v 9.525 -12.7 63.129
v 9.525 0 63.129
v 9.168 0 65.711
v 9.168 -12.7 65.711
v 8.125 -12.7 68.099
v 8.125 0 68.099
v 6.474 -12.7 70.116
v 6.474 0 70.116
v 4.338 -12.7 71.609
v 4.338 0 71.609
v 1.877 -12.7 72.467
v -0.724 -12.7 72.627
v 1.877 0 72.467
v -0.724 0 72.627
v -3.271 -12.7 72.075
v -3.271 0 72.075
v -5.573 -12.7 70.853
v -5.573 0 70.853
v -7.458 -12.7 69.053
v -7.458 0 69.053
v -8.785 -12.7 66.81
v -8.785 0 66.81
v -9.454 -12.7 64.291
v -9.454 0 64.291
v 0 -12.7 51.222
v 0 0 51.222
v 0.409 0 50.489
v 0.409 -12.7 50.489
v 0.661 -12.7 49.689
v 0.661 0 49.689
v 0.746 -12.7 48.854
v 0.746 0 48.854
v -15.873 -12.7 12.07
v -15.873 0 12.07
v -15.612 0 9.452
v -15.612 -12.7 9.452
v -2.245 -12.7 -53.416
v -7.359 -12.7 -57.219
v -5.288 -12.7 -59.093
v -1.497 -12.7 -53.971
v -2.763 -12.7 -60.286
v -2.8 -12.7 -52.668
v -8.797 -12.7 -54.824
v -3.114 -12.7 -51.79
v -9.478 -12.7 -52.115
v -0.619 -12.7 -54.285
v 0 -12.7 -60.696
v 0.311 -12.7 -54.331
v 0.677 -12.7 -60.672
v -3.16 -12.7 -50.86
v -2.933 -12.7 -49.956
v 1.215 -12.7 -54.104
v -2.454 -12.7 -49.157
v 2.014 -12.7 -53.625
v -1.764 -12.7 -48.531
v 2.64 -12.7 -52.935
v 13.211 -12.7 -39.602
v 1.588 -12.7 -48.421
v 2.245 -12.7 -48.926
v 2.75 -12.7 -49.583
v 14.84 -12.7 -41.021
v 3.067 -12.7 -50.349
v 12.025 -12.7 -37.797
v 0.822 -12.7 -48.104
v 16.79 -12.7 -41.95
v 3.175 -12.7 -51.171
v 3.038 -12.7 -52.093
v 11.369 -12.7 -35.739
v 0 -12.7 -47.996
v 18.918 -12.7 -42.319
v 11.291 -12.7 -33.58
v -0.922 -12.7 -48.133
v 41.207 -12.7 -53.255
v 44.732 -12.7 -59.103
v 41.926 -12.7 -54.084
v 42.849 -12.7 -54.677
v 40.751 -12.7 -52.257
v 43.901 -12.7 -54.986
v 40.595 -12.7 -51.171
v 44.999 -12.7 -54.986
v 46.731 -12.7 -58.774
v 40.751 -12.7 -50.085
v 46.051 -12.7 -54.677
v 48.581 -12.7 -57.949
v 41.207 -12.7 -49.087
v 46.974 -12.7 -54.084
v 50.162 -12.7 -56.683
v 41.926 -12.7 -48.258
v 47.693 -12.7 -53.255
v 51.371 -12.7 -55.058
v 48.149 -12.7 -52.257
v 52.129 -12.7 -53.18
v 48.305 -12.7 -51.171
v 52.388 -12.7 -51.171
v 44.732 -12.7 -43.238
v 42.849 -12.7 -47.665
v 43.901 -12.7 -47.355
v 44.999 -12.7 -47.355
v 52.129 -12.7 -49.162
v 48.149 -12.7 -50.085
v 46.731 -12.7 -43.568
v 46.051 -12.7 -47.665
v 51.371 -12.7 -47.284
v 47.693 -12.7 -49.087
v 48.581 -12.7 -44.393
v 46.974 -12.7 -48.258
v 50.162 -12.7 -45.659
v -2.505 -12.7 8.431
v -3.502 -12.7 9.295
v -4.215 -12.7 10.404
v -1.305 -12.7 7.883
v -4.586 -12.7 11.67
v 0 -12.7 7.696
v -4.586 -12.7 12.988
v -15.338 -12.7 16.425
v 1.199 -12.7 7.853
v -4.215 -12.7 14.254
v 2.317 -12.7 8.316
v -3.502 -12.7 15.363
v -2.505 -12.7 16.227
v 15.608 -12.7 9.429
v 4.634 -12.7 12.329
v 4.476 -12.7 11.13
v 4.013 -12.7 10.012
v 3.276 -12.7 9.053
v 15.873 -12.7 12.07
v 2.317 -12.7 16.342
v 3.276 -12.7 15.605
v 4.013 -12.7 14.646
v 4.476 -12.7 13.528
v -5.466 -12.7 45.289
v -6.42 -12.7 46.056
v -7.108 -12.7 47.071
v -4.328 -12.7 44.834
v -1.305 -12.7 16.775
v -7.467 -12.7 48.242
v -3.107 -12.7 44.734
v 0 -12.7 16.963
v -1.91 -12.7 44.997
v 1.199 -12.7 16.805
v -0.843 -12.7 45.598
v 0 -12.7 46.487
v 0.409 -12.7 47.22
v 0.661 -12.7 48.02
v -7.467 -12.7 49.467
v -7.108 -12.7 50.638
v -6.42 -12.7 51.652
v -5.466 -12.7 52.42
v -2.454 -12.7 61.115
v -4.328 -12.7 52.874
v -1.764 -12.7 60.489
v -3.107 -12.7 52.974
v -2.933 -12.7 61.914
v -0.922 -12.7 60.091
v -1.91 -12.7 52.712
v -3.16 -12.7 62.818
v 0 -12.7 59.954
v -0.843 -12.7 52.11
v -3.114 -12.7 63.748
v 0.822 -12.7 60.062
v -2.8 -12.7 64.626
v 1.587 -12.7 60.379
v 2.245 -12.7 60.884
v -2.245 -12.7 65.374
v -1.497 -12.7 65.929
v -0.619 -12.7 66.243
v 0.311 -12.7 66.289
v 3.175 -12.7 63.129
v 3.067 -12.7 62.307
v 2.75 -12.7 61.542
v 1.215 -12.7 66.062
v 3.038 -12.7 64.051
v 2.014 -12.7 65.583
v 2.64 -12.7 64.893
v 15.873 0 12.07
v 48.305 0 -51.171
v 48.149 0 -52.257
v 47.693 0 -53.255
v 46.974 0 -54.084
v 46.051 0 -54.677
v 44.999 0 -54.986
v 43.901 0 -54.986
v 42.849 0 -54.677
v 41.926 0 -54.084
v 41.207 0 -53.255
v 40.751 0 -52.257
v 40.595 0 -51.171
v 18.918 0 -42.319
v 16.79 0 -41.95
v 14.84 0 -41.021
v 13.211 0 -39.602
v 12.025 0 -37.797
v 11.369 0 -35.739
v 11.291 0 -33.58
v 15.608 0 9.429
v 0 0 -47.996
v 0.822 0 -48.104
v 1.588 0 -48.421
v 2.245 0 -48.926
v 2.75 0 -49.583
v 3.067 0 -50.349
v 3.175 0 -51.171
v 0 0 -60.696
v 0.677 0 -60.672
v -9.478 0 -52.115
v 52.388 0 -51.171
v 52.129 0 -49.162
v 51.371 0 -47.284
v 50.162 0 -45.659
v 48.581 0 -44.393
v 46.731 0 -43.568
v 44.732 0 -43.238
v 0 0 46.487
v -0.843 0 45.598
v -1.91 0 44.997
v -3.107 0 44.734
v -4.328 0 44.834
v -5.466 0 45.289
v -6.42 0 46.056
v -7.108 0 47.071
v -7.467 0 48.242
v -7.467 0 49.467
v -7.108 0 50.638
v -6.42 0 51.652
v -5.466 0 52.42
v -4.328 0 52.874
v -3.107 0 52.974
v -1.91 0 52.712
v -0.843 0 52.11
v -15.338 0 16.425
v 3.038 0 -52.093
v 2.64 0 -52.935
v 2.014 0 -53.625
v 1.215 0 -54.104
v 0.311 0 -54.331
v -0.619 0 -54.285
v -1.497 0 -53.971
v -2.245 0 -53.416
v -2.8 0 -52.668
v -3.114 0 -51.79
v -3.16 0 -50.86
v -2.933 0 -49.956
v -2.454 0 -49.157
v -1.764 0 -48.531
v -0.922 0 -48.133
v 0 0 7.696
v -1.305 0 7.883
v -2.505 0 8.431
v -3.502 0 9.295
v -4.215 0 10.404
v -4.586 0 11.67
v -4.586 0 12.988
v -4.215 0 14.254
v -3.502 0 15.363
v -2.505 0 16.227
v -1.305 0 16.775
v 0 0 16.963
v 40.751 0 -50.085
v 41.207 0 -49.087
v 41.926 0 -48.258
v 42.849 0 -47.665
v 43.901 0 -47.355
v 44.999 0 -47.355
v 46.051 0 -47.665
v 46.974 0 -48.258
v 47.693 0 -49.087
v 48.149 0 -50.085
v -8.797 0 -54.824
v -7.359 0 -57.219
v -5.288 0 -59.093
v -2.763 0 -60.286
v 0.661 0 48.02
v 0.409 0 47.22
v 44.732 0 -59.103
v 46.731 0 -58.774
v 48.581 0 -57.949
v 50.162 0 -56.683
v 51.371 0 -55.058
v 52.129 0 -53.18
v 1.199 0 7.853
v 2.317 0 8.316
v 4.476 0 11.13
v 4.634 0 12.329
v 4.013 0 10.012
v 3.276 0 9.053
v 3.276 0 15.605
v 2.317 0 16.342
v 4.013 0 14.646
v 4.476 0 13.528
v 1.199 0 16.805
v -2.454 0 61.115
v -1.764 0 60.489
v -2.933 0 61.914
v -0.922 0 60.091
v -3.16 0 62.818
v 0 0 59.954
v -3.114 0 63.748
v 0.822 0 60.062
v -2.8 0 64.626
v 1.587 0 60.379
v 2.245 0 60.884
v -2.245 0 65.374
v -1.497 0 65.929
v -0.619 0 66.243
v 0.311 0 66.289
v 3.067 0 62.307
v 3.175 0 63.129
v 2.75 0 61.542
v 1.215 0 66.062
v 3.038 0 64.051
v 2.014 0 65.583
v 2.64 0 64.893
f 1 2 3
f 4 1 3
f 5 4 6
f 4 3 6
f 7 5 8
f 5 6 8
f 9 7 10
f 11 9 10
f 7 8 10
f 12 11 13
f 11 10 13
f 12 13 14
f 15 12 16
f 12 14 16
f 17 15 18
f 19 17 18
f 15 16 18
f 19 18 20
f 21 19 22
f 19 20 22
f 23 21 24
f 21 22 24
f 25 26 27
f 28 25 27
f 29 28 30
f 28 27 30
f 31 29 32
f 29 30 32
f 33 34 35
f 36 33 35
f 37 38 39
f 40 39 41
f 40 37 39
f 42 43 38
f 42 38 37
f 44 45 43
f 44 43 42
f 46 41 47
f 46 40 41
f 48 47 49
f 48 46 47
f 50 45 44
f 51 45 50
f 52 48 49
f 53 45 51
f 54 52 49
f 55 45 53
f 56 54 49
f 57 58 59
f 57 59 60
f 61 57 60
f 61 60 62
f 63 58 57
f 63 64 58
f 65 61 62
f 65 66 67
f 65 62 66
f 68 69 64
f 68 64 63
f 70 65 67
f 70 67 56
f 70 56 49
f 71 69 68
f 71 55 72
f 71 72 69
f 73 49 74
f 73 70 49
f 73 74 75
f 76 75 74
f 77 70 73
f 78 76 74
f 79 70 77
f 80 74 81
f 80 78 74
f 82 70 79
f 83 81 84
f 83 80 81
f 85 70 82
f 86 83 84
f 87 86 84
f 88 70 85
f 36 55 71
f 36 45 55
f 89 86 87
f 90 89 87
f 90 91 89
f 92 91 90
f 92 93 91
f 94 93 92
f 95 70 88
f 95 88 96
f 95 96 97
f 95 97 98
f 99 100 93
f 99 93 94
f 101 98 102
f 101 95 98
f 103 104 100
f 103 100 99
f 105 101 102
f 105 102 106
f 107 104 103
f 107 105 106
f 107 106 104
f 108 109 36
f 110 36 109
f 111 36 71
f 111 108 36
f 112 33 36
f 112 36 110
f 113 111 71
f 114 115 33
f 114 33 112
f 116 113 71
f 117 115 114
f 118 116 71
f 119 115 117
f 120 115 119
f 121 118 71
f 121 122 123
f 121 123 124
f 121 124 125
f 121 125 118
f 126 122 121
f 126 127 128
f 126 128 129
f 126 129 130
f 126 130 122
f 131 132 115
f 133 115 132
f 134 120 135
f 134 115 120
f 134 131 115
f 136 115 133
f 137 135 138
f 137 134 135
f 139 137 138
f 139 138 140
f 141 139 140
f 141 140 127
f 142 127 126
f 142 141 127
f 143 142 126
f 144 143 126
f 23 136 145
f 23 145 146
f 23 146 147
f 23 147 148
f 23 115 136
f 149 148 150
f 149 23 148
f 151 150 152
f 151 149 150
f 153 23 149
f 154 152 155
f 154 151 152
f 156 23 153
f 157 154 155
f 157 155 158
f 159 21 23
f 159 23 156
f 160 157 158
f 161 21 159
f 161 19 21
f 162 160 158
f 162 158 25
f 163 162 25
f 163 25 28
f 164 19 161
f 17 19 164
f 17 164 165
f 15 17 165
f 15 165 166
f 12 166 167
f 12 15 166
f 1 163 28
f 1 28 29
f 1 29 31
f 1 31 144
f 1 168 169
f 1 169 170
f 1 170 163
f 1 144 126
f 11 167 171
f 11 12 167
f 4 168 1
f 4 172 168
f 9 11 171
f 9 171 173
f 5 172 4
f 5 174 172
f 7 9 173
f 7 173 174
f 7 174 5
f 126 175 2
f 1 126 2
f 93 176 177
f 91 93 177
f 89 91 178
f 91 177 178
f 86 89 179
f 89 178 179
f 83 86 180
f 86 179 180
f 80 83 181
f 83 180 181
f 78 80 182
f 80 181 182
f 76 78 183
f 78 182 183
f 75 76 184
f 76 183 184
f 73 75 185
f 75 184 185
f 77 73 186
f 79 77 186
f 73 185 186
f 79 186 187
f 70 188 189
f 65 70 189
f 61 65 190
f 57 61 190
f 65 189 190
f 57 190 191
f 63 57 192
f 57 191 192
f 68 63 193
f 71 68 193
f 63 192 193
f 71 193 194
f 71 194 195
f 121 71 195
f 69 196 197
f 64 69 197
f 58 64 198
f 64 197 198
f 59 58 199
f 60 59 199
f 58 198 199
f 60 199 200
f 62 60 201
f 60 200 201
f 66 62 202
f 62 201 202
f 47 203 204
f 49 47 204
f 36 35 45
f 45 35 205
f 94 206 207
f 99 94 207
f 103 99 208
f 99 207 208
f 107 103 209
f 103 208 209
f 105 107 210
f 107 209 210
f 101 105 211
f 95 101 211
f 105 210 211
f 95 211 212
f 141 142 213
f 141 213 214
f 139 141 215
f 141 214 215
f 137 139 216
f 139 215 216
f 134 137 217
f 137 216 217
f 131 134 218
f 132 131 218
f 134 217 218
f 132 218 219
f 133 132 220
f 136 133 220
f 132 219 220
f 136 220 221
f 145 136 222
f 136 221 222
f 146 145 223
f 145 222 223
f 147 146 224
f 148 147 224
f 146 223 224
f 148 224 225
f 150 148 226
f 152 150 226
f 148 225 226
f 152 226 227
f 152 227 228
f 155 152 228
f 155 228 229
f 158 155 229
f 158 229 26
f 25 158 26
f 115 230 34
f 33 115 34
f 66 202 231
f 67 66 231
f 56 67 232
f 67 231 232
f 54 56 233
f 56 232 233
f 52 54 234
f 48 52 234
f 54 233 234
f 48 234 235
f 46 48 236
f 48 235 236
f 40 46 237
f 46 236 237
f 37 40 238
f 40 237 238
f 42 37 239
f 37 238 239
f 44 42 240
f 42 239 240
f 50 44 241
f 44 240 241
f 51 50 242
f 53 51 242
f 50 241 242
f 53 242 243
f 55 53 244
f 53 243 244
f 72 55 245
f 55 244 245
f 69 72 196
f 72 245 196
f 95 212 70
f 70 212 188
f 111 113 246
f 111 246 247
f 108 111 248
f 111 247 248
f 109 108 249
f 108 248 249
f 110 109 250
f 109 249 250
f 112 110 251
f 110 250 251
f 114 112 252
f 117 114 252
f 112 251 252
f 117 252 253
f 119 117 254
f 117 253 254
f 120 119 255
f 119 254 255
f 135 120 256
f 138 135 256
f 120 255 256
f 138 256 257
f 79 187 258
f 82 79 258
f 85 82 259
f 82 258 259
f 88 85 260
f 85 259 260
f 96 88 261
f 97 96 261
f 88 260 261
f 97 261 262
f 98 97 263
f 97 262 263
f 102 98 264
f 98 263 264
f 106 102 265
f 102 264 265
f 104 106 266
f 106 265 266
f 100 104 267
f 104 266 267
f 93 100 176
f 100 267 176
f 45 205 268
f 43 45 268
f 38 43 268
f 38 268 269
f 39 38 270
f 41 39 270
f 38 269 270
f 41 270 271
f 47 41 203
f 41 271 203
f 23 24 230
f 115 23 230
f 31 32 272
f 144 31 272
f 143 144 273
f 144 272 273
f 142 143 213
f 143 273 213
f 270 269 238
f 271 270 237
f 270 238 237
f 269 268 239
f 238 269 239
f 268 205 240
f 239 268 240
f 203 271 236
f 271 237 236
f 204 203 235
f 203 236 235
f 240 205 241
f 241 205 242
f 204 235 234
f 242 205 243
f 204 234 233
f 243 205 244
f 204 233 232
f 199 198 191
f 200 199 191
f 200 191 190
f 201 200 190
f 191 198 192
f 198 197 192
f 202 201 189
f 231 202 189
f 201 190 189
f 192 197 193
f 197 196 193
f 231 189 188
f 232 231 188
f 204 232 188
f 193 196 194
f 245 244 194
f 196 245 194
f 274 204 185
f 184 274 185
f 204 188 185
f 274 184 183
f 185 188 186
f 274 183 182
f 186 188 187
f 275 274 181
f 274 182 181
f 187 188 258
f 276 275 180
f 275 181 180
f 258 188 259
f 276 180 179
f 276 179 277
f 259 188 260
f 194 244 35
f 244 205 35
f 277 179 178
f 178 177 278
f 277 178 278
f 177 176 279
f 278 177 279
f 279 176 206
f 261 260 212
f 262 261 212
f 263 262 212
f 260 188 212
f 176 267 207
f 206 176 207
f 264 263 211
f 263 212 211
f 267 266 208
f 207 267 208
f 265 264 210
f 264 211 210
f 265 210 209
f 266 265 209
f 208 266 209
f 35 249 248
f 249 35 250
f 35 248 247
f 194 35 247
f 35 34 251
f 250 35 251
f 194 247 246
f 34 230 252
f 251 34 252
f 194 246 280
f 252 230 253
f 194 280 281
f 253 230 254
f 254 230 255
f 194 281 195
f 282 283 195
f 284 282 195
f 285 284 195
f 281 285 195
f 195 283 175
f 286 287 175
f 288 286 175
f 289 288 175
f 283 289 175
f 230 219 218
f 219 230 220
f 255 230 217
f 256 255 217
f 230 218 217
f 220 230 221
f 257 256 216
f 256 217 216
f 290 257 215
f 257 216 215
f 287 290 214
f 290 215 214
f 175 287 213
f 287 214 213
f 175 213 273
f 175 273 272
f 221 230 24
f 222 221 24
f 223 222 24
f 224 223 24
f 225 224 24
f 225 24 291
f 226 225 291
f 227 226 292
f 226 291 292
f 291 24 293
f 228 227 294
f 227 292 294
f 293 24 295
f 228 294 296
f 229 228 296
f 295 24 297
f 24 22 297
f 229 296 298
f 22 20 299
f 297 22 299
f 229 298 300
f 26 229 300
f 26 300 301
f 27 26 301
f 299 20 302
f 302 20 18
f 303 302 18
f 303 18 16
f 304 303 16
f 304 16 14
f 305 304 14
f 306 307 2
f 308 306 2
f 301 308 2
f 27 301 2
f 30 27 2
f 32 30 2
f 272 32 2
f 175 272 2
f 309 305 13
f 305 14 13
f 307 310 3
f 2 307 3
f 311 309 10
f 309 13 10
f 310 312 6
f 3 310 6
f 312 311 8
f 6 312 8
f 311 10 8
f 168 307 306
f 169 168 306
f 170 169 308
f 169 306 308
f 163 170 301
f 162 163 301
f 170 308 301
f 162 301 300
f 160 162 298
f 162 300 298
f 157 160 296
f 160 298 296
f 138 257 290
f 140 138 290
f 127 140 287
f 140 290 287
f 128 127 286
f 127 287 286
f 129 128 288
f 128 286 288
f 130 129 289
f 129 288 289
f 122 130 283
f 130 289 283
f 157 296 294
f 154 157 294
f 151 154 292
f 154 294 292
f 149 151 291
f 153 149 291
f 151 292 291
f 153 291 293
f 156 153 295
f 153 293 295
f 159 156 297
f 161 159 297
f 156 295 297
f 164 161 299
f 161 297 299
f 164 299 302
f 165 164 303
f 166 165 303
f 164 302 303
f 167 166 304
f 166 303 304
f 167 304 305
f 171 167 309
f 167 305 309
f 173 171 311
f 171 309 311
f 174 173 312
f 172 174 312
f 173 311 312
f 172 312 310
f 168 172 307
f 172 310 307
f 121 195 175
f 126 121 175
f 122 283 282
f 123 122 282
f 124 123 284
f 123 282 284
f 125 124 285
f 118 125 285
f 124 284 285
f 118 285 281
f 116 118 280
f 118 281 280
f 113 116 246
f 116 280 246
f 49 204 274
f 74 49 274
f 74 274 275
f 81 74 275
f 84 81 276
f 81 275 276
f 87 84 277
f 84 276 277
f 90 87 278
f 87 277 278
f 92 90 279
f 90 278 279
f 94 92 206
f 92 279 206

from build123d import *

# Parameters (mm, degrees)
F1_DEPTH = 12.7
F2_DEPTH = 3.048


with BuildPart() as f1:
    # F0 (on Front) → F1 (new body)
    with BuildSketch(Plane.XZ):
        with BuildLine():
            Line((0, 51.2216350224), (0, 53.6040686))
            ThreePointArc((0, 53.6040686), (-7.1342213589, 56.8180852692), (-9.4538482046, 64.2911267413))
            Line((-9.4538482046, 64.2911267413), (-15.3375121761, 16.4249623056))
            ThreePointArc((-15.3375121761, 16.4249623056), (-9.6693668982, 24.9195002363), (0, 28.2040686))
            Line((0, 28.2040686), (0, 46.4869021777))
            ThreePointArc((0, 46.4869021777), (-7.5126241699, 48.8542686), (0, 51.2216350224))
        make_face()
        with BuildLine():
            ThreePointArc((9.525, 63.1290686), (6.7351920908, 56.3938765092), (0, 53.6040686))
            Line((0, 53.6040686), (0, 51.2216350224))
            ThreePointArc((0, 51.2216350224), (0.5550872912, 50.0953307458), (0.7460008182, 48.8542686))
            ThreePointArc((0.7460008182, 48.8542686), (0.5550872912, 47.6132064543), (0, 46.4869021777))
            Line((0, 46.4869021777), (0, 28.2040686))
            ThreePointArc((0, 28.2040686), (9.6519445425, 24.9328613447), (15.3261239176, 16.4673714724))
            Line((15.3261239176, 16.4673714724), (9.525, 63.1290686))
        make_face()
        with BuildLine():
            ThreePointArc((-9.4538482046, 64.2911267413), (-7.1342213589, 56.8180852692), (0, 53.6040686))
            ThreePointArc((0, 53.6040686), (6.7351920908, 56.3938765092), (9.525, 63.1290686))
            ThreePointArc((9.525, 63.1290686), (0.5821171922, 72.6362640106), (-9.4538482046, 64.2911267413))
        make_face()
        with BuildLine():
            ThreePointArc((3.175, 63.1290686), (2.2450640303, 60.8840045698), (0, 59.9540686))
            ThreePointArc((0, 59.9540686), (-2.2450640303, 65.3741326303), (3.175, 63.1290686))
        make_face(mode=Mode.SUBTRACT)
        with BuildLine():
            Line((15.8728781179, 12.0695204249), (15.3261239176, 16.4673714724))
            ThreePointArc((15.3261239176, 16.4673714724), (9.6519445425, 24.9328613447), (0, 28.2040686))
            Line((0, 28.2040686), (0, 16.9626167222))
            ThreePointArc((0, 16.9626167222), (3.2764132981, 15.6054818982), (4.6335481221, 12.3290686))
            ThreePointArc((4.6335481221, 12.3290686), (3.2764132981, 9.0526553019), (0, 7.6955204779))
            Line((0, 7.6955204779), (0, -3.5459314))
            ThreePointArc((0, -3.5459314), (10.1482027408, 0.1213003301), (15.6077993594, 9.4286851503))
            Line((15.6077993594, 9.4286851503), (15.8728781179, 12.0695204249))
        make_face()
        with BuildLine():
            ThreePointArc((0, 28.2040686), (-9.6693668982, 24.9195002363), (-15.3375121761, 16.4249623056))
            Line((-15.3375121761, 16.4249623056), (-15.8728782216, 12.0695267661))
            Line((-15.8728782216, 12.0695267661), (-15.6120639675, 9.4517289128))
            ThreePointArc((-15.6120639675, 9.4517289128), (-10.1572106768, 0.1287941659), (0, -3.5459314))
            Line((0, -3.5459314), (0, 7.6955204779))
            ThreePointArc((0, 7.6955204779), (-4.6335481221, 12.3290686), (0, 16.9626167222))
            Line((0, 16.9626167222), (0, 28.2040686))
        make_face()
        with BuildLine():
            ThreePointArc((0, -3.5459314), (-10.1572106768, 0.1287941659), (-15.6120639675, 9.4517289128))
            Line((-15.6120639675, 9.4517289128), (-9.4780747266, -52.1152430422))
            ThreePointArc((-9.4780747266, -52.1152430422), (-7.0611682246, -44.7783162619), (0, -41.6459314))
            Line((0, -41.6459314), (0, -3.5459314))
        make_face()
        with BuildLine():
            ThreePointArc((0, -41.6459314), (-7.0611682246, -44.7783162619), (-9.4780747266, -52.1152430422))
            ThreePointArc((-9.4780747266, -52.1152430422), (-6.3926151381, -58.2320996246), (0, -60.6959314))
            Line((0, -60.6959314), (0.6773435479, -60.6718171859))
            ThreePointArc((0.6773435479, -60.6718171859), (6.9705567315, -57.6622304882), (9.525, -51.1709314))
            Line((9.525, -51.1709314), (3.175, -51.1709314))
            ThreePointArc((3.175, -51.1709314), (-2.2450640303, -53.4159954302), (0, -47.9959314))
            Line((0, -47.9959314), (0, -41.6459314))
        make_face()
        with BuildLine():
            ThreePointArc((9.525, -51.1709314), (6.7351920908, -44.4357393092), (0, -41.6459314))
            Line((0, -41.6459314), (0, -47.9959314))
            ThreePointArc((0, -47.9959314), (2.2450640303, -48.9258673697), (3.175, -51.1709314))
            Line((3.175, -51.1709314), (9.525, -51.1709314))
        make_face()
        with BuildLine():
            Line((11.290697226, -33.5802517612), (15.6077993594, 9.4286851503))
            ThreePointArc((15.6077993594, 9.4286851503), (10.1482027408, 0.1213003301), (0, -3.5459314))
            Line((0, -3.5459314), (0, -41.6459314))
            ThreePointArc((0, -41.6459314), (6.7351920908, -44.4357393092), (9.525, -51.1709314))
            Line((9.525, -51.1709314), (36.5125, -51.1709314))
            ThreePointArc((36.5125, -51.1709314), (38.9380895153, -45.459298616), (44.7324052746, -43.2384567854))
            Line((44.7324052746, -43.2384567854), (18.9182890587, -42.3194443799))
            ThreePointArc((18.9182890587, -42.3194443799), (13.2114936015, -39.60206338), (11.290697226, -33.5802517612))
        make_face()
        with BuildLine():
            Line((36.5125, -51.1709314), (9.525, -51.1709314))
            ThreePointArc((9.525, -51.1709314), (6.9705567315, -57.6622304882), (0.6773435479, -60.6718171859))
            Line((0.6773435479, -60.6718171859), (44.7324052746, -59.1034060145))
            ThreePointArc((44.7324052746, -59.1034060145), (38.9380895153, -56.8825641839), (36.5125, -51.1709314))
        make_face()
        with BuildLine():
            ThreePointArc((52.3875, -51.1709314), (50.1616327839, -45.6590209152), (44.7324052746, -43.2384567854))
            ThreePointArc((44.7324052746, -43.2384567854), (38.9380895153, -45.459298616), (36.5125, -51.1709314))
            ThreePointArc((36.5125, -51.1709314), (38.9380895153, -56.8825641839), (44.7324052746, -59.1034060145))
            ThreePointArc((44.7324052746, -59.1034060145), (50.1616327839, -56.6828418847), (52.3875, -51.1709314))
        make_face()
        with BuildLine():
            ThreePointArc((48.30468059, -51.1709314), (44.45, -55.02561199), (40.59531941, -51.1709314))
            ThreePointArc((40.59531941, -51.1709314), (44.45, -47.3162508099), (48.30468059, -51.1709314))
        make_face(mode=Mode.SUBTRACT)
    extrude(amount=F1_DEPTH)

    # F0 (on Front) → F2 (join)
    with BuildSketch(Plane.XZ):
        with BuildLine():
            ThreePointArc((9.525, -51.1709314), (6.7351920908, -44.4357393092), (0, -41.6459314))
            Line((0, -41.6459314), (0, -47.9959314))
            ThreePointArc((0, -47.9959314), (2.2450640303, -48.9258673697), (3.175, -51.1709314))
            Line((3.175, -51.1709314), (9.525, -51.1709314))
        make_face()
    extrude(amount=F2_DEPTH)


solid = f1.part
